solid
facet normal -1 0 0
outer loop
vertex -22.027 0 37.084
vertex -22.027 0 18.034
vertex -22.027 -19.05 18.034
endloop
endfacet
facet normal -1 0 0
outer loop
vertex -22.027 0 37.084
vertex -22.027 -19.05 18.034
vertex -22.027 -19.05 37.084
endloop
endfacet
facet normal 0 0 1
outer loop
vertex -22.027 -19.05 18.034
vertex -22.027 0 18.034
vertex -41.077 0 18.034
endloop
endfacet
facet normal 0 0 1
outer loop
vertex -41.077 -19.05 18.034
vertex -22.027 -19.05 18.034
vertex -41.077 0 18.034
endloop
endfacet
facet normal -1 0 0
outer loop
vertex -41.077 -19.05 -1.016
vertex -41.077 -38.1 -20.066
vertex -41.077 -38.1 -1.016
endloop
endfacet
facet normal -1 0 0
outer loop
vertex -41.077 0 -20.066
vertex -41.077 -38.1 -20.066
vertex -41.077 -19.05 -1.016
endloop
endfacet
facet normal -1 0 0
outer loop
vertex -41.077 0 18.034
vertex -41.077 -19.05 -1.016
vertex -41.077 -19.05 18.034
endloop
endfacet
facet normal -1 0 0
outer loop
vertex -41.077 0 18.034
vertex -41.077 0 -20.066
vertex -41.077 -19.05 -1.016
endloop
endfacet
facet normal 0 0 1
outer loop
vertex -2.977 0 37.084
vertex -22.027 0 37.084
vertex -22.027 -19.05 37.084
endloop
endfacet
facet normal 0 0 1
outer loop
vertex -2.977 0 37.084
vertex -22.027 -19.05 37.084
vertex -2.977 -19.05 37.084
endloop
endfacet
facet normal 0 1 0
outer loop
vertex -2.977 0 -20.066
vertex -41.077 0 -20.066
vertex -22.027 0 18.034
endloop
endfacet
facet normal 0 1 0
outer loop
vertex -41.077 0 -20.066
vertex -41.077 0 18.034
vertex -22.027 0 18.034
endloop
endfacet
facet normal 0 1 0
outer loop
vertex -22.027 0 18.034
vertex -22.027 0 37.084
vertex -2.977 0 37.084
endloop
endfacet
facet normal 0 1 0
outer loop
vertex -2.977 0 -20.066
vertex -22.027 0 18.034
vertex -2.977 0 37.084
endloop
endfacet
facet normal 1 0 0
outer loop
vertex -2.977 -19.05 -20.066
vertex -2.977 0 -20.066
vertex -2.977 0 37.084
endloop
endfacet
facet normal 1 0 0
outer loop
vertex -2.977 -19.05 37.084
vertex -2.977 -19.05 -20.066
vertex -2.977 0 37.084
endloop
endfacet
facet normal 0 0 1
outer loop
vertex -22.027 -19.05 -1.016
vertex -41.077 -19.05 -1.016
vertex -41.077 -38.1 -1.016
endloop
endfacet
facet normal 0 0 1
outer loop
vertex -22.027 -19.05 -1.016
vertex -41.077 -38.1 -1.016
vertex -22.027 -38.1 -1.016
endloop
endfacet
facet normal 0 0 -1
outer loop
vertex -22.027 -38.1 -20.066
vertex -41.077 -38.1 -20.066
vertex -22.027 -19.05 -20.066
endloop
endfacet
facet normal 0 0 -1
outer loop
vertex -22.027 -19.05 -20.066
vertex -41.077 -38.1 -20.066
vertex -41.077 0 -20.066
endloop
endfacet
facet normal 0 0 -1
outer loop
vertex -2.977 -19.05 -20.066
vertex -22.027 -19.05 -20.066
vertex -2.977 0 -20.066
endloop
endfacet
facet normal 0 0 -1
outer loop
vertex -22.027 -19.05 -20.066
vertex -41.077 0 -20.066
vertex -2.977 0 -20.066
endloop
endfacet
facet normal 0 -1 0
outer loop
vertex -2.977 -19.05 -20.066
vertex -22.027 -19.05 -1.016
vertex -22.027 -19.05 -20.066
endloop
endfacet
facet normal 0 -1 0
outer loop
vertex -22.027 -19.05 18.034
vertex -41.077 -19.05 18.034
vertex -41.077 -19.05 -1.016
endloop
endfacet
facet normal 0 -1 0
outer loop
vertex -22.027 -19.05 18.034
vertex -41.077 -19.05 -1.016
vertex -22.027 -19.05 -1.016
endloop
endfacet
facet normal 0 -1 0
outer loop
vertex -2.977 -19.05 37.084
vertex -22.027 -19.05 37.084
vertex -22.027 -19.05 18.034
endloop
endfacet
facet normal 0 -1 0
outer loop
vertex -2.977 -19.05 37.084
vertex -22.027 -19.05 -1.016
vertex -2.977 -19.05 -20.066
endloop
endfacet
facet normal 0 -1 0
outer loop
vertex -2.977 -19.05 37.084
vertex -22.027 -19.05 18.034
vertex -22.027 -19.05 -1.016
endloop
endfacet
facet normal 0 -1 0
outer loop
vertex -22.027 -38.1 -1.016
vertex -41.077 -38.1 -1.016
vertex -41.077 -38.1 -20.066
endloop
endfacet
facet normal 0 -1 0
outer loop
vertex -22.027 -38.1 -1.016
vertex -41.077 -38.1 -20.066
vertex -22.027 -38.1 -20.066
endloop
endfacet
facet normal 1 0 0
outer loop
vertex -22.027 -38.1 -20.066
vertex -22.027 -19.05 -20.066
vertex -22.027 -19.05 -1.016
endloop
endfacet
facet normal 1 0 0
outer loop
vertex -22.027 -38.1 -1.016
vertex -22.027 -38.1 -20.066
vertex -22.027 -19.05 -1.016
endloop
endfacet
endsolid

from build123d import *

# Parameters (mm, degrees)
F0_W     = 19.05
F0_H     = 19.05
F1_DEPTH = 19.05
F2_DEPTH = 19.05
F3_DEPTH = 38.1


with BuildPart() as f1:
    # F0 (on Front) → F1 (new body)
    with BuildSketch(Plane.XZ):
        with Locations((-12.501768, 27.558763)):
            Rectangle(F0_W, F0_H)
    extrude(amount=F1_DEPTH)

    # F0 (on Front) → F2 (join)
    with BuildSketch(Plane.XZ):
        Polygon((-22.026768, -1.016237), (-22.026768, -20.066237), (-2.976768, -20.066237), (-2.976768, 18.033763), (-22.026768, 18.033763), (-41.076768, 18.033763), (-41.076768, -1.016237), align=None)
    extrude(amount=F2_DEPTH)

    # F0 (on Front) → F3 (join)
    with BuildSketch(Plane.XZ):
        with Locations((-31.551768, -10.541237)):
            Rectangle(F0_W, F0_H)
    extrude(amount=F3_DEPTH)


solid = f1.part
